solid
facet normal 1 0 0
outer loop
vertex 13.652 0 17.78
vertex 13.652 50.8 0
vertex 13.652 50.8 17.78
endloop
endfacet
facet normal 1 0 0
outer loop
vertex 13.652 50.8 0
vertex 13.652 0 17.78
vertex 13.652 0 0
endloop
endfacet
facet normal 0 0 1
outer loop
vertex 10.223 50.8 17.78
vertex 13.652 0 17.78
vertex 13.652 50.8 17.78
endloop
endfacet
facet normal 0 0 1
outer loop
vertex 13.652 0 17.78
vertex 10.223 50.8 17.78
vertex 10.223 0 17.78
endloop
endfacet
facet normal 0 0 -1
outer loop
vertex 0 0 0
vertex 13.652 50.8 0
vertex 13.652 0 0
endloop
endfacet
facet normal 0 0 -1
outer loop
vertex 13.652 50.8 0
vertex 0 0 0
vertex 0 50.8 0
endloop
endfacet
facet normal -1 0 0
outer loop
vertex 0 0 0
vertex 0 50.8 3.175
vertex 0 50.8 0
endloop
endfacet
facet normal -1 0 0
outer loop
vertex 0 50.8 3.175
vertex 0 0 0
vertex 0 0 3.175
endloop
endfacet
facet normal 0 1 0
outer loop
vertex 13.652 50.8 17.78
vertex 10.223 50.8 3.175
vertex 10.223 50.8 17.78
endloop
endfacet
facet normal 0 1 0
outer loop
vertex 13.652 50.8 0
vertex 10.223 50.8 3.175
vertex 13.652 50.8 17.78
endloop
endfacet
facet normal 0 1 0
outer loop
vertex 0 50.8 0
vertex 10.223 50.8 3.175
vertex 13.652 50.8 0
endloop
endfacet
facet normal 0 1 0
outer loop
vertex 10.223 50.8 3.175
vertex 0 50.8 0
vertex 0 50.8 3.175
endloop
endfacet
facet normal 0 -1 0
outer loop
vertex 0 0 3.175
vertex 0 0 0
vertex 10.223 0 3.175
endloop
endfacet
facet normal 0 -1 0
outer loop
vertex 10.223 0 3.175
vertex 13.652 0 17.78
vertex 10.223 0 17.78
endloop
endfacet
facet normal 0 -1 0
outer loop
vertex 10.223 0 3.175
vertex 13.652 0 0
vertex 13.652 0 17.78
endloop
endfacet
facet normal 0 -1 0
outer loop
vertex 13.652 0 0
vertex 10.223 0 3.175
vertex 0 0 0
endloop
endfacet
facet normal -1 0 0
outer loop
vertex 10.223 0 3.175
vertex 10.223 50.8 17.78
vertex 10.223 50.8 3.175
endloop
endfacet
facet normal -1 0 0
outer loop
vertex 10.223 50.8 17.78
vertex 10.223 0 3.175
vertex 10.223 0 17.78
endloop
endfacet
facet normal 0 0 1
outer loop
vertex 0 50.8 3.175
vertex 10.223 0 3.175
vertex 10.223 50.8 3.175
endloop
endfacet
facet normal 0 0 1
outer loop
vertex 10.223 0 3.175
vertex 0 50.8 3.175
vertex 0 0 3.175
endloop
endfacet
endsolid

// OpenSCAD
$fn=100;

// All dimensions in inches

InterDeckSpace = 0.7; // from PlainBase.scad
BatteryWidth = 1.5;
Width = BatteryWidth + 0.5;
Thickness = 0.125;
ClipLength = 0.35;
//BumpSize = 0.03125;
BumpSize = 0.0625;

module Box()
{
  union() {
    cube([ClipLength + BumpSize + Thickness, Width, InterDeckSpace]);
  }
}

module Cutout()
{
  union() {
    translate([-0.01, -0.01, Thickness]) cube([ClipLength + BumpSize, Width+0.1, InterDeckSpace + 0.5]);
  }
}

scale([25.4, 25.4, 25.4]) {
  difference() {
    Box(); 
    Cutout();
  }
}
